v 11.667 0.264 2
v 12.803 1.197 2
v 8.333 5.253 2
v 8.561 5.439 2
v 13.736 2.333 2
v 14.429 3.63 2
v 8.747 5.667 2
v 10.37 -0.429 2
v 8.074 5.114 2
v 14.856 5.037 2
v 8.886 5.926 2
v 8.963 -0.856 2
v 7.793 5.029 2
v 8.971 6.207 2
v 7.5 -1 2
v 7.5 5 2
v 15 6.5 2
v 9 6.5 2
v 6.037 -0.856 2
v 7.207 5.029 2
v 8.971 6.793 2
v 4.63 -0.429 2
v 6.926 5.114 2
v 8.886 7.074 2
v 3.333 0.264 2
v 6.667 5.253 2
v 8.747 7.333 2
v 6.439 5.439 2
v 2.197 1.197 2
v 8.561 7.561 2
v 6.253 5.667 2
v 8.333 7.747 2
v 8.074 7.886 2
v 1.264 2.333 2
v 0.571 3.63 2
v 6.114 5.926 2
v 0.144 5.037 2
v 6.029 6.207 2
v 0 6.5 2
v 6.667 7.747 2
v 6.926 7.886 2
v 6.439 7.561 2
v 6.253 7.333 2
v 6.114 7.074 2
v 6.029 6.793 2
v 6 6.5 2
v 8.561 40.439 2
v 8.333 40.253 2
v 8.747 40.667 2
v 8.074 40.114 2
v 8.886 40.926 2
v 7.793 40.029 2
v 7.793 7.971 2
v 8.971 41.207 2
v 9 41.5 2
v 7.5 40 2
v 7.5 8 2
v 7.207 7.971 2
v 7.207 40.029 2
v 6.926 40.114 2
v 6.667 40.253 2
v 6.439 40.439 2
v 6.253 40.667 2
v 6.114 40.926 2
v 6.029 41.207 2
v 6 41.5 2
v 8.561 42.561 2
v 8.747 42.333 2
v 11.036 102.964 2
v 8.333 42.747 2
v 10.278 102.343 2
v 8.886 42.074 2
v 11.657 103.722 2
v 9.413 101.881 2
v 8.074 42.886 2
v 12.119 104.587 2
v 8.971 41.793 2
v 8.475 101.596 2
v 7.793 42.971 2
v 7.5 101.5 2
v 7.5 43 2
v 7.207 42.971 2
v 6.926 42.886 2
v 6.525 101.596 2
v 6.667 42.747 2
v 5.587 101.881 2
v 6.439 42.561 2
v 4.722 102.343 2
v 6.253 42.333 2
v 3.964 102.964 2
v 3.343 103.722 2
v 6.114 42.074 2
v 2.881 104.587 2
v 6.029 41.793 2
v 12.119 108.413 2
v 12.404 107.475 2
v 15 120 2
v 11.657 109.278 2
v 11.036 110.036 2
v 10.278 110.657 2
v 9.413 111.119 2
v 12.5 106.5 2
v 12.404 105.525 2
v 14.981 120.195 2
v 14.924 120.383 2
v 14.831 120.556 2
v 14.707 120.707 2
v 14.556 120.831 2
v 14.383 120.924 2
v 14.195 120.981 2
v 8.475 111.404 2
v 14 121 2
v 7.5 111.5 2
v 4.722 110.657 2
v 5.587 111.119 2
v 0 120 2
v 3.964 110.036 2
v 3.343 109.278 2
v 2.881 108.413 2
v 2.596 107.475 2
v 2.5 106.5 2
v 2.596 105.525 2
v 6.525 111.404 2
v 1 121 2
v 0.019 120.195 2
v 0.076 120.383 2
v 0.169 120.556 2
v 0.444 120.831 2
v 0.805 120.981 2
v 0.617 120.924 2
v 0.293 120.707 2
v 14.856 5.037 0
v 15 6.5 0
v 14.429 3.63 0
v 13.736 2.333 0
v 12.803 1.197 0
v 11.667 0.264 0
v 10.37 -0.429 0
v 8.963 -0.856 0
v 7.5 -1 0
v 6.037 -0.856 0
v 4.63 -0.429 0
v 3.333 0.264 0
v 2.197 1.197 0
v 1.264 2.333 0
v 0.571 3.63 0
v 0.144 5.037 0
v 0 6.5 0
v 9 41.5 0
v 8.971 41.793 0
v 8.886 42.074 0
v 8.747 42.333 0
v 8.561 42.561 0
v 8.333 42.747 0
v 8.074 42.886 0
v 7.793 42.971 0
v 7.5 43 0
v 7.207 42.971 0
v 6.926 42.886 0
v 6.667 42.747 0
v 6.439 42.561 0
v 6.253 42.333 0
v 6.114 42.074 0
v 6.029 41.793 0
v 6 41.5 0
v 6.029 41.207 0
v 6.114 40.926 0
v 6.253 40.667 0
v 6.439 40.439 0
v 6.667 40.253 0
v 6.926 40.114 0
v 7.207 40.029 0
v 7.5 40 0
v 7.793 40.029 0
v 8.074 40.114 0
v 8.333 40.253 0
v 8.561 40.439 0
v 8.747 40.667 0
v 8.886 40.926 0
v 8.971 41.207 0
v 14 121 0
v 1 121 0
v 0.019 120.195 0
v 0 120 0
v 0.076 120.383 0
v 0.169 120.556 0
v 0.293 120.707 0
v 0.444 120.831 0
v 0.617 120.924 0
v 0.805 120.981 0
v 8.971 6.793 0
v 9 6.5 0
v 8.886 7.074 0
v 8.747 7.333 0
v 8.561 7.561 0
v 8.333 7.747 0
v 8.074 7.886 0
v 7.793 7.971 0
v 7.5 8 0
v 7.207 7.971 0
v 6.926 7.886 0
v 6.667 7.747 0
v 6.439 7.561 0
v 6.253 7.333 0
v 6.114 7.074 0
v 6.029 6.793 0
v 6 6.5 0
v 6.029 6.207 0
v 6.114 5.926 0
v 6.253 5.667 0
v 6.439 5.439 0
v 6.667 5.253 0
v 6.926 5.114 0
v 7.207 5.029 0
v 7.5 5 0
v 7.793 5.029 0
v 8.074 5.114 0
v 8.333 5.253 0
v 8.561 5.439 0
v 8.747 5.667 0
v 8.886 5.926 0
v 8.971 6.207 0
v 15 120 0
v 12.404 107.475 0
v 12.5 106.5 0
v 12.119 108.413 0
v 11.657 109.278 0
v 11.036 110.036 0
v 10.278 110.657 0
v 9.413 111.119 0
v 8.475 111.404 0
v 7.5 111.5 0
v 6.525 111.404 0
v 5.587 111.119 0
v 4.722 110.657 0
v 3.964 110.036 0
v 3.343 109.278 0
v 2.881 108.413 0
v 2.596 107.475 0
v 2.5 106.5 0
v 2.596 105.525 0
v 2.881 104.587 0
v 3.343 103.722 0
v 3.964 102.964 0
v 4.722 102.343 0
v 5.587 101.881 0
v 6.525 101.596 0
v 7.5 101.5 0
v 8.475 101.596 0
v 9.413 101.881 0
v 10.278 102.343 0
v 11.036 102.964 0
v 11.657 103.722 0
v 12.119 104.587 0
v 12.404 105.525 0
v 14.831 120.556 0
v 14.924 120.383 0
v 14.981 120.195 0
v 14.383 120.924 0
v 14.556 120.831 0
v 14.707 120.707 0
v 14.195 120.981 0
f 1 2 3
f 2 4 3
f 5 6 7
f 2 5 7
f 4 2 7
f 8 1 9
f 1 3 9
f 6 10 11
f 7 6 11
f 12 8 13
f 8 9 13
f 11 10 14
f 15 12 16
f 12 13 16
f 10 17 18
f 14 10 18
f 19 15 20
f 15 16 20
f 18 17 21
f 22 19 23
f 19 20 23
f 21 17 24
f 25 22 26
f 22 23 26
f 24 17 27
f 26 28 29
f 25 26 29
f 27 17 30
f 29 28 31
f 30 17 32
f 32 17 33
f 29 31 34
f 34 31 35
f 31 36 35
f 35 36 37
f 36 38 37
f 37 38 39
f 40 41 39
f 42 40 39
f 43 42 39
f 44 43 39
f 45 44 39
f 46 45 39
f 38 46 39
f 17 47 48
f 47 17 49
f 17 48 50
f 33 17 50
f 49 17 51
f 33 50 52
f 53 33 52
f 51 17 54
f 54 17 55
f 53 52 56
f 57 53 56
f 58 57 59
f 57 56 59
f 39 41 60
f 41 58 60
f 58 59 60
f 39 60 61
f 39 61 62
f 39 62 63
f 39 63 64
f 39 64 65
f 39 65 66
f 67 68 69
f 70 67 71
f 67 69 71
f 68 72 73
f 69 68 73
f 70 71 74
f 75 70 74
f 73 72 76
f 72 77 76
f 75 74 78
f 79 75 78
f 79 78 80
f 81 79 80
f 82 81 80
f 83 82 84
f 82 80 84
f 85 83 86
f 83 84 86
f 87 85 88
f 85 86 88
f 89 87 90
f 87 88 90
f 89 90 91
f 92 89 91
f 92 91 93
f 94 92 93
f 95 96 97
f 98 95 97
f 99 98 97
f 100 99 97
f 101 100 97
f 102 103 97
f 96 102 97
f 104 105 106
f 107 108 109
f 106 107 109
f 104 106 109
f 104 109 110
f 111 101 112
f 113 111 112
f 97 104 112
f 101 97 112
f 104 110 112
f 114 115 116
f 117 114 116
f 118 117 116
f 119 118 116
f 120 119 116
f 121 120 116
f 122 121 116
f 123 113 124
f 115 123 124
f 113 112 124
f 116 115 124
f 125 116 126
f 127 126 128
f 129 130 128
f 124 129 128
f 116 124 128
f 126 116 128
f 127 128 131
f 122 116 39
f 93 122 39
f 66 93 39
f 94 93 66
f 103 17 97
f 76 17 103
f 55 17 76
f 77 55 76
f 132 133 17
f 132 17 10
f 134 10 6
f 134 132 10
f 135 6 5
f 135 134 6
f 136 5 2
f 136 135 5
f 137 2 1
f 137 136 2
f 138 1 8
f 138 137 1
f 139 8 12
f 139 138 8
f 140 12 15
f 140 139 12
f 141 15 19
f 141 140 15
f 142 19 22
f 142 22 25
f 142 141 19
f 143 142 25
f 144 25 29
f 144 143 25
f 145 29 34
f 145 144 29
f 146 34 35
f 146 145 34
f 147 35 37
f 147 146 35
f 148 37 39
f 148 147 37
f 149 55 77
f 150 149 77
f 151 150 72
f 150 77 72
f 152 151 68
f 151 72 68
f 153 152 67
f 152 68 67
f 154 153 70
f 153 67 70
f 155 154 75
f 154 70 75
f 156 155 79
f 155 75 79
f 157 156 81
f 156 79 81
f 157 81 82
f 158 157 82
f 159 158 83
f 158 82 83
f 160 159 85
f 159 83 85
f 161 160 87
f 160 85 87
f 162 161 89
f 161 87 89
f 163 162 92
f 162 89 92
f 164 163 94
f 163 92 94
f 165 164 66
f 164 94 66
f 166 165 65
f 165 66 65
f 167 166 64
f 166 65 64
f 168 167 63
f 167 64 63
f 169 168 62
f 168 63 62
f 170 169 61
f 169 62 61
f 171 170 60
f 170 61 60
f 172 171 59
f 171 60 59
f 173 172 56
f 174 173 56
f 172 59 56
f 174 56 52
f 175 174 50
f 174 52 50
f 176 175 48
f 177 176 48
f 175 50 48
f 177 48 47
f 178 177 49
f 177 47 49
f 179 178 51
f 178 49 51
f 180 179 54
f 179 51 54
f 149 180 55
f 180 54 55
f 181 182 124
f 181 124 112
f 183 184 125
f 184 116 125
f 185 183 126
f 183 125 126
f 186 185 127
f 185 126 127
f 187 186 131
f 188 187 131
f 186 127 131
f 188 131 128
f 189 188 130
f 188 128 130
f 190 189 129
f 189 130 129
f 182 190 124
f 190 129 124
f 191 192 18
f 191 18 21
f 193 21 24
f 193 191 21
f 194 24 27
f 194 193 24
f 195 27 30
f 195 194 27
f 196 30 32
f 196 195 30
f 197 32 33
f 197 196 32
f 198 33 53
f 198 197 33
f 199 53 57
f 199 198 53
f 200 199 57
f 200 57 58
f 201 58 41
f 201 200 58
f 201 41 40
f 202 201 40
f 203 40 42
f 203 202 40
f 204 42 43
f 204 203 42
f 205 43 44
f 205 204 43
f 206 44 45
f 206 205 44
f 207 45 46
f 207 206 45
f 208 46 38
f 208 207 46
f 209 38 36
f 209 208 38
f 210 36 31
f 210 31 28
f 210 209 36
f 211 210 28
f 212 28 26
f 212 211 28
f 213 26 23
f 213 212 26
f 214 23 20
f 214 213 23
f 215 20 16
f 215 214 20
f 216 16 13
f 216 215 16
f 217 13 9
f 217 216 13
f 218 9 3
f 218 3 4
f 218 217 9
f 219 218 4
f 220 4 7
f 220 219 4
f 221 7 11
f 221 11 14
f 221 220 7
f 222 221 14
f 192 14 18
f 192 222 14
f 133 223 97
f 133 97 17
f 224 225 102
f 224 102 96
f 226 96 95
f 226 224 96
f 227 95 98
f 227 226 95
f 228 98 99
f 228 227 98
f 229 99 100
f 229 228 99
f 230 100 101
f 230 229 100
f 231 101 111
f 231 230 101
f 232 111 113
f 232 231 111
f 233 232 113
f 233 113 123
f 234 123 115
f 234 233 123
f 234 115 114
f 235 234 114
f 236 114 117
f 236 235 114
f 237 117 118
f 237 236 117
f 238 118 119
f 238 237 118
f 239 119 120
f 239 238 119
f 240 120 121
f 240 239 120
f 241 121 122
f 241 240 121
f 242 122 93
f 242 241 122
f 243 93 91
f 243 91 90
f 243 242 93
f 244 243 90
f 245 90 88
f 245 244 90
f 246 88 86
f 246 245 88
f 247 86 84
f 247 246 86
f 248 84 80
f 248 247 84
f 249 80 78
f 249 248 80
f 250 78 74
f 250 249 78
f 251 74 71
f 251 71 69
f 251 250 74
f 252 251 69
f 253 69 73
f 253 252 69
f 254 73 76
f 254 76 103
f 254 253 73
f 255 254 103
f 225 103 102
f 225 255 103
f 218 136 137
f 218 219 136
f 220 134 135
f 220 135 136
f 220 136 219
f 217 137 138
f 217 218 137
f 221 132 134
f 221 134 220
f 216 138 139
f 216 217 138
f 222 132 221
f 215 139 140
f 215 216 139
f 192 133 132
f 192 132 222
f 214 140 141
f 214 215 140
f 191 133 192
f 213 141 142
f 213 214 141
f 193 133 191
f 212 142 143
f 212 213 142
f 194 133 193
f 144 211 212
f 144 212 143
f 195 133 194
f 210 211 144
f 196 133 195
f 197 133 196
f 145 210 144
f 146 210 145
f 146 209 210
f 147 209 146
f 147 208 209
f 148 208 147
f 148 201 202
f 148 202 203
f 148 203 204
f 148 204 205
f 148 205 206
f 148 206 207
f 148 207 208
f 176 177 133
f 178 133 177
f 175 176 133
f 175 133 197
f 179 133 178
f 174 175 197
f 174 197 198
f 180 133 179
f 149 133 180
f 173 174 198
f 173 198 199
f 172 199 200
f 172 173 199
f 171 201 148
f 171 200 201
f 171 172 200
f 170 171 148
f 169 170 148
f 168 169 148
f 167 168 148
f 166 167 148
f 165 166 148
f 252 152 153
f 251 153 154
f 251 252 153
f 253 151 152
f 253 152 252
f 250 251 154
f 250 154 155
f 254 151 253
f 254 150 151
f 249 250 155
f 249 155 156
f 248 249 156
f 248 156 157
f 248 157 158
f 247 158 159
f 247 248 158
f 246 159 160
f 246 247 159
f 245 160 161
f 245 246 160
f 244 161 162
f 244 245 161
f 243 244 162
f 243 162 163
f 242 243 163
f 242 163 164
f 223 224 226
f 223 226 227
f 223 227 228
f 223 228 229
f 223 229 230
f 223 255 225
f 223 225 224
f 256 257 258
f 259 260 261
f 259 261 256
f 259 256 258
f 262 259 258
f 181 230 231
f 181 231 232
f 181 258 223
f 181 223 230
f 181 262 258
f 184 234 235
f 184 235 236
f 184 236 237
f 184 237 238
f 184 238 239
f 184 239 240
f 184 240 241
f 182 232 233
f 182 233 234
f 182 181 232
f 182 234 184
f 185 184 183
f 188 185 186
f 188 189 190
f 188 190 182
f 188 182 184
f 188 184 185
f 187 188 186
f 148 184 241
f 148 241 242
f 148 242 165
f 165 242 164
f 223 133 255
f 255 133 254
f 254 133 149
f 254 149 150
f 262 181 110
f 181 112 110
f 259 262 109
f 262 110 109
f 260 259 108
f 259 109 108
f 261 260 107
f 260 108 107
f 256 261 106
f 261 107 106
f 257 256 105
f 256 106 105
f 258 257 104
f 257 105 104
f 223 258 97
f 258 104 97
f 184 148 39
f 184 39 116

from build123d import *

# Parameters (mm, degrees)
BOSS_EXTRUDE2_DEPTH = 2
CUT_EXTRUDE1_DEPTH  = 2
FILLET1_R           = 1


with BuildPart() as part:
    # Sketch2 → Boss-Extrude2 (new body)
    with BuildSketch(Plane.XY):
        with BuildLine():
            Line((0, 100), (0, 6.5))
            ThreePointArc((0, 6.5), (7.5, -1), (15, 6.5))
            Line((15, 6.5), (15, 100))
            Line((15, 100), (15, 121))
            Line((15, 121), (7.5, 121))
            Line((7.5, 121), (0, 121))
            Line((0, 121), (0, 100))
        make_face()
        with BuildLine():
            ThreePointArc((9, 6.5), (6.439339828, 5.439339828), (7.5, 8))
            ThreePointArc((7.5, 8), (8.560660172, 7.560660172), (9, 6.5))
        make_face(mode=Mode.SUBTRACT)
        with BuildLine():
            ThreePointArc((12.5, 106.5), (11.035533906, 102.964466094), (7.5, 101.5))
            ThreePointArc((7.5, 101.5), (3.964466094, 110.035533906), (12.5, 106.5))
        make_face(mode=Mode.SUBTRACT)
    extrude(amount=BOSS_EXTRUDE2_DEPTH)

    # Sketch3 → Cut-Extrude1 (cut)
    with BuildSketch(Plane.XY.offset(2)):
        with BuildLine():
            ThreePointArc((7.5, 43), (6.439339828, 40.439339828), (9, 41.5))
            ThreePointArc((9, 41.5), (8.560660172, 42.560660172), (7.5, 43))
        make_face()
    extrude(amount=-CUT_EXTRUDE1_DEPTH, mode=Mode.SUBTRACT)

    # Fillet1
    fillet1_edges = [part.edges().sort_by_distance(p)[0] for p in [
        (15, 121, 1),
        (0, 121, 1),
    ]]
    fillet(fillet1_edges, radius=FILLET1_R)


solid = part.part
